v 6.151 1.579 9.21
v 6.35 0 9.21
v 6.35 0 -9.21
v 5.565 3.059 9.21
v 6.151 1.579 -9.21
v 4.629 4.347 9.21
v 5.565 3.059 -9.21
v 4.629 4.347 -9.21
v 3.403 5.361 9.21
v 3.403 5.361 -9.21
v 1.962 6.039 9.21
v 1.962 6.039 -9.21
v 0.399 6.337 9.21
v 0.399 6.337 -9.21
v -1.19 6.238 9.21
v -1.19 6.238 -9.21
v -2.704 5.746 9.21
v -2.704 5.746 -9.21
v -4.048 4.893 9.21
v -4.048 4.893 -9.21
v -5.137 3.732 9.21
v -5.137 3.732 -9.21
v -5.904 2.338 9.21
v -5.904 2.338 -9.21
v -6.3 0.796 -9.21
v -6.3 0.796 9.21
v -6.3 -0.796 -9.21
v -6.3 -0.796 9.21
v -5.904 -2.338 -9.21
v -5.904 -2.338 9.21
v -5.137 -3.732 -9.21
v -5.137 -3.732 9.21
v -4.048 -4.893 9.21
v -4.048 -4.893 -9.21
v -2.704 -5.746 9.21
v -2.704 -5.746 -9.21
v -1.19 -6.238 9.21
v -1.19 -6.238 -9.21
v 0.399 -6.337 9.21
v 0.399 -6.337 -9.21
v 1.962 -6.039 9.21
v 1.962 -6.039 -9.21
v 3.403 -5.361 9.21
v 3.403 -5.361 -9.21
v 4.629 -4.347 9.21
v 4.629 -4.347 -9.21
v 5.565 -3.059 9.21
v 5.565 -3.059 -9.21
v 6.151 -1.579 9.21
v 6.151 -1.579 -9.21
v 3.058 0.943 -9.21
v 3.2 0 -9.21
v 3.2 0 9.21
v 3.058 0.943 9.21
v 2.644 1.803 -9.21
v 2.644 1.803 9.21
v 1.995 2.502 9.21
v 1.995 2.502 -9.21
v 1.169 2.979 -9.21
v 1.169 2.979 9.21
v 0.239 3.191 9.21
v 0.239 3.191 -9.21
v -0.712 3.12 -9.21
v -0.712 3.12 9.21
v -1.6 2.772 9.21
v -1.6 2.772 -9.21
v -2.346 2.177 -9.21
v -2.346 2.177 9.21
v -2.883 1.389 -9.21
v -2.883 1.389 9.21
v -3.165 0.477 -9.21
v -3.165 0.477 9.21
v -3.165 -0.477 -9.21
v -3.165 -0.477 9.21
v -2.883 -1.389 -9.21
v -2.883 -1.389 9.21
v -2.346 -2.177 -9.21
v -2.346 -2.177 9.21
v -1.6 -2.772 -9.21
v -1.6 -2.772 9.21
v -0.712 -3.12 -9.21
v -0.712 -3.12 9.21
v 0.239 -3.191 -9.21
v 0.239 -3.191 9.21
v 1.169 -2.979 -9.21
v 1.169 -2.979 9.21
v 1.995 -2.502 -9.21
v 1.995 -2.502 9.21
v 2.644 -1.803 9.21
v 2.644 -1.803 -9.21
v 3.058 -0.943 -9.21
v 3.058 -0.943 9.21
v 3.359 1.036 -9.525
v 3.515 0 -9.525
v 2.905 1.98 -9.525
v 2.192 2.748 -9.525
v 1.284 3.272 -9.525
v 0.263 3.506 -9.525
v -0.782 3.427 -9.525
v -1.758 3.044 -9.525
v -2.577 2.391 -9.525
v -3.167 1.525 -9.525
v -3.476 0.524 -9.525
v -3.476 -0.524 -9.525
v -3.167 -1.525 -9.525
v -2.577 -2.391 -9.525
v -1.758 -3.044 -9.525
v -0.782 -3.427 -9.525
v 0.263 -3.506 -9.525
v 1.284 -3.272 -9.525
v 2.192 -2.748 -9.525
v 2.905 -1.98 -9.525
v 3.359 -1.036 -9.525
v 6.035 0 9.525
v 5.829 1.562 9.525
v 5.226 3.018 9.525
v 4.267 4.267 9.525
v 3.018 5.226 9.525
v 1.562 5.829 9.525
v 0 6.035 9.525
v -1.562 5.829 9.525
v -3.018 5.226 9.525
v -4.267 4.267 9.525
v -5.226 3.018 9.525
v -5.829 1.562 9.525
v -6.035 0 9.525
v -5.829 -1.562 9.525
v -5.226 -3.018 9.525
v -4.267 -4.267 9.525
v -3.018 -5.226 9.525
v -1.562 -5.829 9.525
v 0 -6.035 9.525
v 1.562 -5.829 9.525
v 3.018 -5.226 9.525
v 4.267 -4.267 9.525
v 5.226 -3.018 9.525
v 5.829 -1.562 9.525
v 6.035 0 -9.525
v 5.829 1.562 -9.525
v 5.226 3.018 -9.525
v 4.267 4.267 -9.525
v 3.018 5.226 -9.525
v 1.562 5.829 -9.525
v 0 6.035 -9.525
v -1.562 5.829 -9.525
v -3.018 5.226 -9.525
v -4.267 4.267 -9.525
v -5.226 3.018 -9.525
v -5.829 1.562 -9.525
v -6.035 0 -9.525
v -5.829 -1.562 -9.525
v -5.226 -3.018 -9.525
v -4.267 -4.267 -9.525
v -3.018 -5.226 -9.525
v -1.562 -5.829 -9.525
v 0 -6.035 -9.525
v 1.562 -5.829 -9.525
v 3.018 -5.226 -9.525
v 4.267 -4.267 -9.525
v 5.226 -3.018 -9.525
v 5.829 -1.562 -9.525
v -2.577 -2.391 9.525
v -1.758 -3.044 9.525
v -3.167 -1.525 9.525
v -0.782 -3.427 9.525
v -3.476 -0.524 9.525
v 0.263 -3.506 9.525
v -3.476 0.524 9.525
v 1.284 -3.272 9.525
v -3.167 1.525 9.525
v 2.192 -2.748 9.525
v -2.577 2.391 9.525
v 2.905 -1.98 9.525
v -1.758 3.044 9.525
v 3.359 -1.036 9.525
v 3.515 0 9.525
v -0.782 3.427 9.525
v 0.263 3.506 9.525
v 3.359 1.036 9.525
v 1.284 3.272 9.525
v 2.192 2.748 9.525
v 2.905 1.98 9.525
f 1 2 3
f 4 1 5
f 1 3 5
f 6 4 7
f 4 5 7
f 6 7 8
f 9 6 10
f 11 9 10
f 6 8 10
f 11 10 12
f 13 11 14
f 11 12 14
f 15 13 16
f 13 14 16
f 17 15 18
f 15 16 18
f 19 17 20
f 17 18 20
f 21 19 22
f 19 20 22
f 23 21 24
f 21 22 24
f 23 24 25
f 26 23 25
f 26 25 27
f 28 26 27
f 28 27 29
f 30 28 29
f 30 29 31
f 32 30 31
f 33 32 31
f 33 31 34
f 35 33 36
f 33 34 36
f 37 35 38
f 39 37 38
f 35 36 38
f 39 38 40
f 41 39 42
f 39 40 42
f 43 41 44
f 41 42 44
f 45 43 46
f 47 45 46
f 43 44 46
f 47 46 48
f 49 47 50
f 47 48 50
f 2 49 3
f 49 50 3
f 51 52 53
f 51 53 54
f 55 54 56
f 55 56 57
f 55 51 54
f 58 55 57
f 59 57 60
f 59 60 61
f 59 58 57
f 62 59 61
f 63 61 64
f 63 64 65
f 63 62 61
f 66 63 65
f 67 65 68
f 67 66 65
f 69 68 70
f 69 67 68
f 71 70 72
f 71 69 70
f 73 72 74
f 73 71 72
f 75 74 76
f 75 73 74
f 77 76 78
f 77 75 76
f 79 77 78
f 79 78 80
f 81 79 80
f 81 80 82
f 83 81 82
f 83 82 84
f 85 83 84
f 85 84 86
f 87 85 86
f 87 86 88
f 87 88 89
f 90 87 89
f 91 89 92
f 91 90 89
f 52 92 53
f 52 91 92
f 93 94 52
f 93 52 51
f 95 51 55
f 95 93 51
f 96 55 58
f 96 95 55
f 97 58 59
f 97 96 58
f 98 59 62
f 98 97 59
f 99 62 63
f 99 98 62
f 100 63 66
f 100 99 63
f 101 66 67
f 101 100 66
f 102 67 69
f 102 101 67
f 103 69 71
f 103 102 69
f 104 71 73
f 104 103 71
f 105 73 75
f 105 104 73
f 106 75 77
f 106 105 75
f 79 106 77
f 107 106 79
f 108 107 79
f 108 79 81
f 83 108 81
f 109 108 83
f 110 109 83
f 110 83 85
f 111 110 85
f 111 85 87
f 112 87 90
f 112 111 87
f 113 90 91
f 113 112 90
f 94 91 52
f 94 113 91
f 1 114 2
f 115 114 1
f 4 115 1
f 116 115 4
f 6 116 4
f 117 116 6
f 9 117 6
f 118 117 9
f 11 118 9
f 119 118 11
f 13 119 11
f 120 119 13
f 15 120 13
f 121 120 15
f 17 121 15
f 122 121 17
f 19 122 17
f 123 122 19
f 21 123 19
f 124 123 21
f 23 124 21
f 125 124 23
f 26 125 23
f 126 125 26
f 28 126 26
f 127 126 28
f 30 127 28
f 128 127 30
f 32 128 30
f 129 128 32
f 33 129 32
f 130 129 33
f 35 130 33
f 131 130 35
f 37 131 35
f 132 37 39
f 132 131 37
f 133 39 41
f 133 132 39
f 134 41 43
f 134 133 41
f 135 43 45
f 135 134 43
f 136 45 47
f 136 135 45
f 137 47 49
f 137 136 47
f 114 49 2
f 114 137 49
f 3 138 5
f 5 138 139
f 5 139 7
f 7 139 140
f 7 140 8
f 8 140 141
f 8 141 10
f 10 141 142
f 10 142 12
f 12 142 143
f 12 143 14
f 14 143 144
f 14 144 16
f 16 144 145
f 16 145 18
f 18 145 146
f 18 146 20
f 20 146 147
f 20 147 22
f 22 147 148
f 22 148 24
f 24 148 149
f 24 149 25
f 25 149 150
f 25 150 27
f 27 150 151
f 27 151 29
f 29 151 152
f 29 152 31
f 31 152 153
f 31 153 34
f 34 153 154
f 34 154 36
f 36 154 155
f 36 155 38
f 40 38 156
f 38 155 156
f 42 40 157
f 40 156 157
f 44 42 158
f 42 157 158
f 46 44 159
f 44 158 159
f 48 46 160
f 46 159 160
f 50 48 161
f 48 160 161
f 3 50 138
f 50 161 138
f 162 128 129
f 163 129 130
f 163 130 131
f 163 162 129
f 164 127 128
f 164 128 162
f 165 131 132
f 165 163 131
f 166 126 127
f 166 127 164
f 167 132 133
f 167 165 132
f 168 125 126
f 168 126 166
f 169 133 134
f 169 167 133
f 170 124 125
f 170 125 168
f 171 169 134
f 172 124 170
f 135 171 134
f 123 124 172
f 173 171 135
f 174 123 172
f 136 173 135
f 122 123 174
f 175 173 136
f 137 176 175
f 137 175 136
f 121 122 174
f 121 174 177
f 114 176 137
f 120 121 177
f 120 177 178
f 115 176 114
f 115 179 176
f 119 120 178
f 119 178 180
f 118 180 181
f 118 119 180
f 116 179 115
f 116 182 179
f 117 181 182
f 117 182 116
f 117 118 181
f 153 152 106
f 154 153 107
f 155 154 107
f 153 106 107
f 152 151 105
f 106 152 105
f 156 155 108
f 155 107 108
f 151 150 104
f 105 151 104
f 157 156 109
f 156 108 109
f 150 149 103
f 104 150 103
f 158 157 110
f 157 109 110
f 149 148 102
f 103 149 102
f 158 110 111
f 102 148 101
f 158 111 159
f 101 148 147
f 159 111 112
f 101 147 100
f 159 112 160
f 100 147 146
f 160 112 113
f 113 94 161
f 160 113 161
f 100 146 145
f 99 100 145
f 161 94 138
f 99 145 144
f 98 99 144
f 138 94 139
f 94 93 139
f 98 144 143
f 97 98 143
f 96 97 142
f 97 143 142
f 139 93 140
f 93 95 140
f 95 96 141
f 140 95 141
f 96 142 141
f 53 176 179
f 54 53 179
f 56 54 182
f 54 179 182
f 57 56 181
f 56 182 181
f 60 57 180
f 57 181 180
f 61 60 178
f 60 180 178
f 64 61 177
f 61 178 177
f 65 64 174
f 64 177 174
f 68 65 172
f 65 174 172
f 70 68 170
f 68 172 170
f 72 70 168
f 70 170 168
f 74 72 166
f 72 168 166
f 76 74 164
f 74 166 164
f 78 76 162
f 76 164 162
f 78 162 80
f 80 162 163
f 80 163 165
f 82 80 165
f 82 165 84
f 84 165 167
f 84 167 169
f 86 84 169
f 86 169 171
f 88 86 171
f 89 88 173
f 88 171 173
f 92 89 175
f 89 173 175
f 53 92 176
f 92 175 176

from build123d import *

# Parameters (mm, degrees)
BOSS_EXTRUDE1_DEPTH      = 9.525
BOSS_EXTRUDE1_DEPTH_BACK = 9.525
SKETCH3_R                = 6.35
SKETCH3_R_2              = 3.2004
CHAMFER1_SIZE            = 0.31496


with BuildPart() as part:
    # Sketch3 → Boss-Extrude1 (new, two sides: drawn at the far end of the back side and taken through both)
    with BuildSketch(Plane.XY.offset(-BOSS_EXTRUDE1_DEPTH_BACK)):
        Circle(SKETCH3_R)
        Circle(SKETCH3_R_2, mode=Mode.SUBTRACT)
    extrude(amount=BOSS_EXTRUDE1_DEPTH + BOSS_EXTRUDE1_DEPTH_BACK)

    # Chamfer1
    chamfer1_edges = [part.edges().sort_by_distance(p)[0] for p in [
        (-6.35, 0, -9.525),
        (-3.2004, 0, -9.525),
        (-6.35, 0, 9.525),
        (-3.2004, 0, 9.525),
    ]]
    chamfer(chamfer1_edges, length=CHAMFER1_SIZE)


solid = part.part
